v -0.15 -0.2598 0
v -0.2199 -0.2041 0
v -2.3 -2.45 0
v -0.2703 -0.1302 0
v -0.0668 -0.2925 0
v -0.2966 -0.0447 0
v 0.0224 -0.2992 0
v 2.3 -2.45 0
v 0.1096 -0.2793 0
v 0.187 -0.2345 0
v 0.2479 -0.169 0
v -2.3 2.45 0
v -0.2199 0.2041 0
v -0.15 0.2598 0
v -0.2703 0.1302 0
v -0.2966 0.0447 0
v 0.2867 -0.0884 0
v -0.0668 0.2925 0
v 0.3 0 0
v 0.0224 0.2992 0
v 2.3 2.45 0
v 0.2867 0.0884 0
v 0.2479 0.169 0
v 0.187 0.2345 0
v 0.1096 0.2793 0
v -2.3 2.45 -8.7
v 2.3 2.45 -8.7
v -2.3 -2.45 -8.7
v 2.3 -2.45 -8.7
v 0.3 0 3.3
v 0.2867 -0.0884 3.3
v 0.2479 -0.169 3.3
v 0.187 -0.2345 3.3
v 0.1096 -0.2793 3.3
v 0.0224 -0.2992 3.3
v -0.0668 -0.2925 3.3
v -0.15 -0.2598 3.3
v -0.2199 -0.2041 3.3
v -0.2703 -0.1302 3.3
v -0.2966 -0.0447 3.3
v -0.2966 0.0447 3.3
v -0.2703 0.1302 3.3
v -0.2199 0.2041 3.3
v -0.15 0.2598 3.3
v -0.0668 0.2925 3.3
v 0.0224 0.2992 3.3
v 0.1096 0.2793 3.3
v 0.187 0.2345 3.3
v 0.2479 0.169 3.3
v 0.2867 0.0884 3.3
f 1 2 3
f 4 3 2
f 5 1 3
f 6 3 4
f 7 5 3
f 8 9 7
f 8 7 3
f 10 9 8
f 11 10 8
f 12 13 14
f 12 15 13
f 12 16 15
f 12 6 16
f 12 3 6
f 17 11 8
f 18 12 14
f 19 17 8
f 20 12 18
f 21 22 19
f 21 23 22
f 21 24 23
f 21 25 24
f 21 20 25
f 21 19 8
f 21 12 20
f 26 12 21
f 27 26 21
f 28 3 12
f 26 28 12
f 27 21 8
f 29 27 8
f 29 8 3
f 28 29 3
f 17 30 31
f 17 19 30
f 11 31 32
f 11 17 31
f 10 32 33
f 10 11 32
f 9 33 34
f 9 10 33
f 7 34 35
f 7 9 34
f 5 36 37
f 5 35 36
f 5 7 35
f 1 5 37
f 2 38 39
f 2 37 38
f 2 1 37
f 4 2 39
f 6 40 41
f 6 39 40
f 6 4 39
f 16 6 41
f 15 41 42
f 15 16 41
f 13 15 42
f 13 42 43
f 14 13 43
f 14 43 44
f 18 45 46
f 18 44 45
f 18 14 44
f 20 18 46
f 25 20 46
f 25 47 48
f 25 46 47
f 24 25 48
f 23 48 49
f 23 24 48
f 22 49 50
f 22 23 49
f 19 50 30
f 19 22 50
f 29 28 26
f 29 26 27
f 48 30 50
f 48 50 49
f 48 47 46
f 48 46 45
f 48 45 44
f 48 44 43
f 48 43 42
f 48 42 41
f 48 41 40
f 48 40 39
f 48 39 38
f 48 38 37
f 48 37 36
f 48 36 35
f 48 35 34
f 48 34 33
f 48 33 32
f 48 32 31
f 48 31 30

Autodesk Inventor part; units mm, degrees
ref_plane "YZ Plane" through (0, 0, 0) normal (1, 0, 0) x (0, 1, 0)
ref_plane "XZ Plane" through (0, 0, 0) normal (0, 1, 0) x (-1, 0, 0)
ref_plane "XY Plane" through (0, 0, 0) normal (0, 0, 1) x (1, 0, 0)
sketch "Sketch1" plane through (0, 0, 0) normal (0, 0, 1) x (1, 0, 0)
  line L0 (-2.3, 2.45) -> (2.3, 2.45)
  line L1 (2.3, 2.45) -> (2.3, -2.45)
  line L2 (2.3, -2.45) -> (-2.3, -2.45)
  line L3 (-2.3, -2.45) -> (-2.3, 2.45)
  line L4 (0, 3.43) -> (0, -3.43) projected
  line L5 (-3.22, 0) -> (3.22, 0) projected
  point P0 (0, 0)
  dimension "d0" = 4.6
  dimension "d1" = 4.9
extrude "Body" add sketch "Sketch1" against normal blind 8.7
sketch "Sketch2" plane through (0, 0, 0) normal (0, 0, 1) x (1, 0, 0)
  circle A0 centre (0, 0) radius 0.3
  dimension "d4" = 0.6
extrude "Extrusion2" add sketch "Sketch2" along normal blind 3.3
properties part number "Jinlong_Z4TH5B1241992_VibrationMotor_NoHub_Mockup"
